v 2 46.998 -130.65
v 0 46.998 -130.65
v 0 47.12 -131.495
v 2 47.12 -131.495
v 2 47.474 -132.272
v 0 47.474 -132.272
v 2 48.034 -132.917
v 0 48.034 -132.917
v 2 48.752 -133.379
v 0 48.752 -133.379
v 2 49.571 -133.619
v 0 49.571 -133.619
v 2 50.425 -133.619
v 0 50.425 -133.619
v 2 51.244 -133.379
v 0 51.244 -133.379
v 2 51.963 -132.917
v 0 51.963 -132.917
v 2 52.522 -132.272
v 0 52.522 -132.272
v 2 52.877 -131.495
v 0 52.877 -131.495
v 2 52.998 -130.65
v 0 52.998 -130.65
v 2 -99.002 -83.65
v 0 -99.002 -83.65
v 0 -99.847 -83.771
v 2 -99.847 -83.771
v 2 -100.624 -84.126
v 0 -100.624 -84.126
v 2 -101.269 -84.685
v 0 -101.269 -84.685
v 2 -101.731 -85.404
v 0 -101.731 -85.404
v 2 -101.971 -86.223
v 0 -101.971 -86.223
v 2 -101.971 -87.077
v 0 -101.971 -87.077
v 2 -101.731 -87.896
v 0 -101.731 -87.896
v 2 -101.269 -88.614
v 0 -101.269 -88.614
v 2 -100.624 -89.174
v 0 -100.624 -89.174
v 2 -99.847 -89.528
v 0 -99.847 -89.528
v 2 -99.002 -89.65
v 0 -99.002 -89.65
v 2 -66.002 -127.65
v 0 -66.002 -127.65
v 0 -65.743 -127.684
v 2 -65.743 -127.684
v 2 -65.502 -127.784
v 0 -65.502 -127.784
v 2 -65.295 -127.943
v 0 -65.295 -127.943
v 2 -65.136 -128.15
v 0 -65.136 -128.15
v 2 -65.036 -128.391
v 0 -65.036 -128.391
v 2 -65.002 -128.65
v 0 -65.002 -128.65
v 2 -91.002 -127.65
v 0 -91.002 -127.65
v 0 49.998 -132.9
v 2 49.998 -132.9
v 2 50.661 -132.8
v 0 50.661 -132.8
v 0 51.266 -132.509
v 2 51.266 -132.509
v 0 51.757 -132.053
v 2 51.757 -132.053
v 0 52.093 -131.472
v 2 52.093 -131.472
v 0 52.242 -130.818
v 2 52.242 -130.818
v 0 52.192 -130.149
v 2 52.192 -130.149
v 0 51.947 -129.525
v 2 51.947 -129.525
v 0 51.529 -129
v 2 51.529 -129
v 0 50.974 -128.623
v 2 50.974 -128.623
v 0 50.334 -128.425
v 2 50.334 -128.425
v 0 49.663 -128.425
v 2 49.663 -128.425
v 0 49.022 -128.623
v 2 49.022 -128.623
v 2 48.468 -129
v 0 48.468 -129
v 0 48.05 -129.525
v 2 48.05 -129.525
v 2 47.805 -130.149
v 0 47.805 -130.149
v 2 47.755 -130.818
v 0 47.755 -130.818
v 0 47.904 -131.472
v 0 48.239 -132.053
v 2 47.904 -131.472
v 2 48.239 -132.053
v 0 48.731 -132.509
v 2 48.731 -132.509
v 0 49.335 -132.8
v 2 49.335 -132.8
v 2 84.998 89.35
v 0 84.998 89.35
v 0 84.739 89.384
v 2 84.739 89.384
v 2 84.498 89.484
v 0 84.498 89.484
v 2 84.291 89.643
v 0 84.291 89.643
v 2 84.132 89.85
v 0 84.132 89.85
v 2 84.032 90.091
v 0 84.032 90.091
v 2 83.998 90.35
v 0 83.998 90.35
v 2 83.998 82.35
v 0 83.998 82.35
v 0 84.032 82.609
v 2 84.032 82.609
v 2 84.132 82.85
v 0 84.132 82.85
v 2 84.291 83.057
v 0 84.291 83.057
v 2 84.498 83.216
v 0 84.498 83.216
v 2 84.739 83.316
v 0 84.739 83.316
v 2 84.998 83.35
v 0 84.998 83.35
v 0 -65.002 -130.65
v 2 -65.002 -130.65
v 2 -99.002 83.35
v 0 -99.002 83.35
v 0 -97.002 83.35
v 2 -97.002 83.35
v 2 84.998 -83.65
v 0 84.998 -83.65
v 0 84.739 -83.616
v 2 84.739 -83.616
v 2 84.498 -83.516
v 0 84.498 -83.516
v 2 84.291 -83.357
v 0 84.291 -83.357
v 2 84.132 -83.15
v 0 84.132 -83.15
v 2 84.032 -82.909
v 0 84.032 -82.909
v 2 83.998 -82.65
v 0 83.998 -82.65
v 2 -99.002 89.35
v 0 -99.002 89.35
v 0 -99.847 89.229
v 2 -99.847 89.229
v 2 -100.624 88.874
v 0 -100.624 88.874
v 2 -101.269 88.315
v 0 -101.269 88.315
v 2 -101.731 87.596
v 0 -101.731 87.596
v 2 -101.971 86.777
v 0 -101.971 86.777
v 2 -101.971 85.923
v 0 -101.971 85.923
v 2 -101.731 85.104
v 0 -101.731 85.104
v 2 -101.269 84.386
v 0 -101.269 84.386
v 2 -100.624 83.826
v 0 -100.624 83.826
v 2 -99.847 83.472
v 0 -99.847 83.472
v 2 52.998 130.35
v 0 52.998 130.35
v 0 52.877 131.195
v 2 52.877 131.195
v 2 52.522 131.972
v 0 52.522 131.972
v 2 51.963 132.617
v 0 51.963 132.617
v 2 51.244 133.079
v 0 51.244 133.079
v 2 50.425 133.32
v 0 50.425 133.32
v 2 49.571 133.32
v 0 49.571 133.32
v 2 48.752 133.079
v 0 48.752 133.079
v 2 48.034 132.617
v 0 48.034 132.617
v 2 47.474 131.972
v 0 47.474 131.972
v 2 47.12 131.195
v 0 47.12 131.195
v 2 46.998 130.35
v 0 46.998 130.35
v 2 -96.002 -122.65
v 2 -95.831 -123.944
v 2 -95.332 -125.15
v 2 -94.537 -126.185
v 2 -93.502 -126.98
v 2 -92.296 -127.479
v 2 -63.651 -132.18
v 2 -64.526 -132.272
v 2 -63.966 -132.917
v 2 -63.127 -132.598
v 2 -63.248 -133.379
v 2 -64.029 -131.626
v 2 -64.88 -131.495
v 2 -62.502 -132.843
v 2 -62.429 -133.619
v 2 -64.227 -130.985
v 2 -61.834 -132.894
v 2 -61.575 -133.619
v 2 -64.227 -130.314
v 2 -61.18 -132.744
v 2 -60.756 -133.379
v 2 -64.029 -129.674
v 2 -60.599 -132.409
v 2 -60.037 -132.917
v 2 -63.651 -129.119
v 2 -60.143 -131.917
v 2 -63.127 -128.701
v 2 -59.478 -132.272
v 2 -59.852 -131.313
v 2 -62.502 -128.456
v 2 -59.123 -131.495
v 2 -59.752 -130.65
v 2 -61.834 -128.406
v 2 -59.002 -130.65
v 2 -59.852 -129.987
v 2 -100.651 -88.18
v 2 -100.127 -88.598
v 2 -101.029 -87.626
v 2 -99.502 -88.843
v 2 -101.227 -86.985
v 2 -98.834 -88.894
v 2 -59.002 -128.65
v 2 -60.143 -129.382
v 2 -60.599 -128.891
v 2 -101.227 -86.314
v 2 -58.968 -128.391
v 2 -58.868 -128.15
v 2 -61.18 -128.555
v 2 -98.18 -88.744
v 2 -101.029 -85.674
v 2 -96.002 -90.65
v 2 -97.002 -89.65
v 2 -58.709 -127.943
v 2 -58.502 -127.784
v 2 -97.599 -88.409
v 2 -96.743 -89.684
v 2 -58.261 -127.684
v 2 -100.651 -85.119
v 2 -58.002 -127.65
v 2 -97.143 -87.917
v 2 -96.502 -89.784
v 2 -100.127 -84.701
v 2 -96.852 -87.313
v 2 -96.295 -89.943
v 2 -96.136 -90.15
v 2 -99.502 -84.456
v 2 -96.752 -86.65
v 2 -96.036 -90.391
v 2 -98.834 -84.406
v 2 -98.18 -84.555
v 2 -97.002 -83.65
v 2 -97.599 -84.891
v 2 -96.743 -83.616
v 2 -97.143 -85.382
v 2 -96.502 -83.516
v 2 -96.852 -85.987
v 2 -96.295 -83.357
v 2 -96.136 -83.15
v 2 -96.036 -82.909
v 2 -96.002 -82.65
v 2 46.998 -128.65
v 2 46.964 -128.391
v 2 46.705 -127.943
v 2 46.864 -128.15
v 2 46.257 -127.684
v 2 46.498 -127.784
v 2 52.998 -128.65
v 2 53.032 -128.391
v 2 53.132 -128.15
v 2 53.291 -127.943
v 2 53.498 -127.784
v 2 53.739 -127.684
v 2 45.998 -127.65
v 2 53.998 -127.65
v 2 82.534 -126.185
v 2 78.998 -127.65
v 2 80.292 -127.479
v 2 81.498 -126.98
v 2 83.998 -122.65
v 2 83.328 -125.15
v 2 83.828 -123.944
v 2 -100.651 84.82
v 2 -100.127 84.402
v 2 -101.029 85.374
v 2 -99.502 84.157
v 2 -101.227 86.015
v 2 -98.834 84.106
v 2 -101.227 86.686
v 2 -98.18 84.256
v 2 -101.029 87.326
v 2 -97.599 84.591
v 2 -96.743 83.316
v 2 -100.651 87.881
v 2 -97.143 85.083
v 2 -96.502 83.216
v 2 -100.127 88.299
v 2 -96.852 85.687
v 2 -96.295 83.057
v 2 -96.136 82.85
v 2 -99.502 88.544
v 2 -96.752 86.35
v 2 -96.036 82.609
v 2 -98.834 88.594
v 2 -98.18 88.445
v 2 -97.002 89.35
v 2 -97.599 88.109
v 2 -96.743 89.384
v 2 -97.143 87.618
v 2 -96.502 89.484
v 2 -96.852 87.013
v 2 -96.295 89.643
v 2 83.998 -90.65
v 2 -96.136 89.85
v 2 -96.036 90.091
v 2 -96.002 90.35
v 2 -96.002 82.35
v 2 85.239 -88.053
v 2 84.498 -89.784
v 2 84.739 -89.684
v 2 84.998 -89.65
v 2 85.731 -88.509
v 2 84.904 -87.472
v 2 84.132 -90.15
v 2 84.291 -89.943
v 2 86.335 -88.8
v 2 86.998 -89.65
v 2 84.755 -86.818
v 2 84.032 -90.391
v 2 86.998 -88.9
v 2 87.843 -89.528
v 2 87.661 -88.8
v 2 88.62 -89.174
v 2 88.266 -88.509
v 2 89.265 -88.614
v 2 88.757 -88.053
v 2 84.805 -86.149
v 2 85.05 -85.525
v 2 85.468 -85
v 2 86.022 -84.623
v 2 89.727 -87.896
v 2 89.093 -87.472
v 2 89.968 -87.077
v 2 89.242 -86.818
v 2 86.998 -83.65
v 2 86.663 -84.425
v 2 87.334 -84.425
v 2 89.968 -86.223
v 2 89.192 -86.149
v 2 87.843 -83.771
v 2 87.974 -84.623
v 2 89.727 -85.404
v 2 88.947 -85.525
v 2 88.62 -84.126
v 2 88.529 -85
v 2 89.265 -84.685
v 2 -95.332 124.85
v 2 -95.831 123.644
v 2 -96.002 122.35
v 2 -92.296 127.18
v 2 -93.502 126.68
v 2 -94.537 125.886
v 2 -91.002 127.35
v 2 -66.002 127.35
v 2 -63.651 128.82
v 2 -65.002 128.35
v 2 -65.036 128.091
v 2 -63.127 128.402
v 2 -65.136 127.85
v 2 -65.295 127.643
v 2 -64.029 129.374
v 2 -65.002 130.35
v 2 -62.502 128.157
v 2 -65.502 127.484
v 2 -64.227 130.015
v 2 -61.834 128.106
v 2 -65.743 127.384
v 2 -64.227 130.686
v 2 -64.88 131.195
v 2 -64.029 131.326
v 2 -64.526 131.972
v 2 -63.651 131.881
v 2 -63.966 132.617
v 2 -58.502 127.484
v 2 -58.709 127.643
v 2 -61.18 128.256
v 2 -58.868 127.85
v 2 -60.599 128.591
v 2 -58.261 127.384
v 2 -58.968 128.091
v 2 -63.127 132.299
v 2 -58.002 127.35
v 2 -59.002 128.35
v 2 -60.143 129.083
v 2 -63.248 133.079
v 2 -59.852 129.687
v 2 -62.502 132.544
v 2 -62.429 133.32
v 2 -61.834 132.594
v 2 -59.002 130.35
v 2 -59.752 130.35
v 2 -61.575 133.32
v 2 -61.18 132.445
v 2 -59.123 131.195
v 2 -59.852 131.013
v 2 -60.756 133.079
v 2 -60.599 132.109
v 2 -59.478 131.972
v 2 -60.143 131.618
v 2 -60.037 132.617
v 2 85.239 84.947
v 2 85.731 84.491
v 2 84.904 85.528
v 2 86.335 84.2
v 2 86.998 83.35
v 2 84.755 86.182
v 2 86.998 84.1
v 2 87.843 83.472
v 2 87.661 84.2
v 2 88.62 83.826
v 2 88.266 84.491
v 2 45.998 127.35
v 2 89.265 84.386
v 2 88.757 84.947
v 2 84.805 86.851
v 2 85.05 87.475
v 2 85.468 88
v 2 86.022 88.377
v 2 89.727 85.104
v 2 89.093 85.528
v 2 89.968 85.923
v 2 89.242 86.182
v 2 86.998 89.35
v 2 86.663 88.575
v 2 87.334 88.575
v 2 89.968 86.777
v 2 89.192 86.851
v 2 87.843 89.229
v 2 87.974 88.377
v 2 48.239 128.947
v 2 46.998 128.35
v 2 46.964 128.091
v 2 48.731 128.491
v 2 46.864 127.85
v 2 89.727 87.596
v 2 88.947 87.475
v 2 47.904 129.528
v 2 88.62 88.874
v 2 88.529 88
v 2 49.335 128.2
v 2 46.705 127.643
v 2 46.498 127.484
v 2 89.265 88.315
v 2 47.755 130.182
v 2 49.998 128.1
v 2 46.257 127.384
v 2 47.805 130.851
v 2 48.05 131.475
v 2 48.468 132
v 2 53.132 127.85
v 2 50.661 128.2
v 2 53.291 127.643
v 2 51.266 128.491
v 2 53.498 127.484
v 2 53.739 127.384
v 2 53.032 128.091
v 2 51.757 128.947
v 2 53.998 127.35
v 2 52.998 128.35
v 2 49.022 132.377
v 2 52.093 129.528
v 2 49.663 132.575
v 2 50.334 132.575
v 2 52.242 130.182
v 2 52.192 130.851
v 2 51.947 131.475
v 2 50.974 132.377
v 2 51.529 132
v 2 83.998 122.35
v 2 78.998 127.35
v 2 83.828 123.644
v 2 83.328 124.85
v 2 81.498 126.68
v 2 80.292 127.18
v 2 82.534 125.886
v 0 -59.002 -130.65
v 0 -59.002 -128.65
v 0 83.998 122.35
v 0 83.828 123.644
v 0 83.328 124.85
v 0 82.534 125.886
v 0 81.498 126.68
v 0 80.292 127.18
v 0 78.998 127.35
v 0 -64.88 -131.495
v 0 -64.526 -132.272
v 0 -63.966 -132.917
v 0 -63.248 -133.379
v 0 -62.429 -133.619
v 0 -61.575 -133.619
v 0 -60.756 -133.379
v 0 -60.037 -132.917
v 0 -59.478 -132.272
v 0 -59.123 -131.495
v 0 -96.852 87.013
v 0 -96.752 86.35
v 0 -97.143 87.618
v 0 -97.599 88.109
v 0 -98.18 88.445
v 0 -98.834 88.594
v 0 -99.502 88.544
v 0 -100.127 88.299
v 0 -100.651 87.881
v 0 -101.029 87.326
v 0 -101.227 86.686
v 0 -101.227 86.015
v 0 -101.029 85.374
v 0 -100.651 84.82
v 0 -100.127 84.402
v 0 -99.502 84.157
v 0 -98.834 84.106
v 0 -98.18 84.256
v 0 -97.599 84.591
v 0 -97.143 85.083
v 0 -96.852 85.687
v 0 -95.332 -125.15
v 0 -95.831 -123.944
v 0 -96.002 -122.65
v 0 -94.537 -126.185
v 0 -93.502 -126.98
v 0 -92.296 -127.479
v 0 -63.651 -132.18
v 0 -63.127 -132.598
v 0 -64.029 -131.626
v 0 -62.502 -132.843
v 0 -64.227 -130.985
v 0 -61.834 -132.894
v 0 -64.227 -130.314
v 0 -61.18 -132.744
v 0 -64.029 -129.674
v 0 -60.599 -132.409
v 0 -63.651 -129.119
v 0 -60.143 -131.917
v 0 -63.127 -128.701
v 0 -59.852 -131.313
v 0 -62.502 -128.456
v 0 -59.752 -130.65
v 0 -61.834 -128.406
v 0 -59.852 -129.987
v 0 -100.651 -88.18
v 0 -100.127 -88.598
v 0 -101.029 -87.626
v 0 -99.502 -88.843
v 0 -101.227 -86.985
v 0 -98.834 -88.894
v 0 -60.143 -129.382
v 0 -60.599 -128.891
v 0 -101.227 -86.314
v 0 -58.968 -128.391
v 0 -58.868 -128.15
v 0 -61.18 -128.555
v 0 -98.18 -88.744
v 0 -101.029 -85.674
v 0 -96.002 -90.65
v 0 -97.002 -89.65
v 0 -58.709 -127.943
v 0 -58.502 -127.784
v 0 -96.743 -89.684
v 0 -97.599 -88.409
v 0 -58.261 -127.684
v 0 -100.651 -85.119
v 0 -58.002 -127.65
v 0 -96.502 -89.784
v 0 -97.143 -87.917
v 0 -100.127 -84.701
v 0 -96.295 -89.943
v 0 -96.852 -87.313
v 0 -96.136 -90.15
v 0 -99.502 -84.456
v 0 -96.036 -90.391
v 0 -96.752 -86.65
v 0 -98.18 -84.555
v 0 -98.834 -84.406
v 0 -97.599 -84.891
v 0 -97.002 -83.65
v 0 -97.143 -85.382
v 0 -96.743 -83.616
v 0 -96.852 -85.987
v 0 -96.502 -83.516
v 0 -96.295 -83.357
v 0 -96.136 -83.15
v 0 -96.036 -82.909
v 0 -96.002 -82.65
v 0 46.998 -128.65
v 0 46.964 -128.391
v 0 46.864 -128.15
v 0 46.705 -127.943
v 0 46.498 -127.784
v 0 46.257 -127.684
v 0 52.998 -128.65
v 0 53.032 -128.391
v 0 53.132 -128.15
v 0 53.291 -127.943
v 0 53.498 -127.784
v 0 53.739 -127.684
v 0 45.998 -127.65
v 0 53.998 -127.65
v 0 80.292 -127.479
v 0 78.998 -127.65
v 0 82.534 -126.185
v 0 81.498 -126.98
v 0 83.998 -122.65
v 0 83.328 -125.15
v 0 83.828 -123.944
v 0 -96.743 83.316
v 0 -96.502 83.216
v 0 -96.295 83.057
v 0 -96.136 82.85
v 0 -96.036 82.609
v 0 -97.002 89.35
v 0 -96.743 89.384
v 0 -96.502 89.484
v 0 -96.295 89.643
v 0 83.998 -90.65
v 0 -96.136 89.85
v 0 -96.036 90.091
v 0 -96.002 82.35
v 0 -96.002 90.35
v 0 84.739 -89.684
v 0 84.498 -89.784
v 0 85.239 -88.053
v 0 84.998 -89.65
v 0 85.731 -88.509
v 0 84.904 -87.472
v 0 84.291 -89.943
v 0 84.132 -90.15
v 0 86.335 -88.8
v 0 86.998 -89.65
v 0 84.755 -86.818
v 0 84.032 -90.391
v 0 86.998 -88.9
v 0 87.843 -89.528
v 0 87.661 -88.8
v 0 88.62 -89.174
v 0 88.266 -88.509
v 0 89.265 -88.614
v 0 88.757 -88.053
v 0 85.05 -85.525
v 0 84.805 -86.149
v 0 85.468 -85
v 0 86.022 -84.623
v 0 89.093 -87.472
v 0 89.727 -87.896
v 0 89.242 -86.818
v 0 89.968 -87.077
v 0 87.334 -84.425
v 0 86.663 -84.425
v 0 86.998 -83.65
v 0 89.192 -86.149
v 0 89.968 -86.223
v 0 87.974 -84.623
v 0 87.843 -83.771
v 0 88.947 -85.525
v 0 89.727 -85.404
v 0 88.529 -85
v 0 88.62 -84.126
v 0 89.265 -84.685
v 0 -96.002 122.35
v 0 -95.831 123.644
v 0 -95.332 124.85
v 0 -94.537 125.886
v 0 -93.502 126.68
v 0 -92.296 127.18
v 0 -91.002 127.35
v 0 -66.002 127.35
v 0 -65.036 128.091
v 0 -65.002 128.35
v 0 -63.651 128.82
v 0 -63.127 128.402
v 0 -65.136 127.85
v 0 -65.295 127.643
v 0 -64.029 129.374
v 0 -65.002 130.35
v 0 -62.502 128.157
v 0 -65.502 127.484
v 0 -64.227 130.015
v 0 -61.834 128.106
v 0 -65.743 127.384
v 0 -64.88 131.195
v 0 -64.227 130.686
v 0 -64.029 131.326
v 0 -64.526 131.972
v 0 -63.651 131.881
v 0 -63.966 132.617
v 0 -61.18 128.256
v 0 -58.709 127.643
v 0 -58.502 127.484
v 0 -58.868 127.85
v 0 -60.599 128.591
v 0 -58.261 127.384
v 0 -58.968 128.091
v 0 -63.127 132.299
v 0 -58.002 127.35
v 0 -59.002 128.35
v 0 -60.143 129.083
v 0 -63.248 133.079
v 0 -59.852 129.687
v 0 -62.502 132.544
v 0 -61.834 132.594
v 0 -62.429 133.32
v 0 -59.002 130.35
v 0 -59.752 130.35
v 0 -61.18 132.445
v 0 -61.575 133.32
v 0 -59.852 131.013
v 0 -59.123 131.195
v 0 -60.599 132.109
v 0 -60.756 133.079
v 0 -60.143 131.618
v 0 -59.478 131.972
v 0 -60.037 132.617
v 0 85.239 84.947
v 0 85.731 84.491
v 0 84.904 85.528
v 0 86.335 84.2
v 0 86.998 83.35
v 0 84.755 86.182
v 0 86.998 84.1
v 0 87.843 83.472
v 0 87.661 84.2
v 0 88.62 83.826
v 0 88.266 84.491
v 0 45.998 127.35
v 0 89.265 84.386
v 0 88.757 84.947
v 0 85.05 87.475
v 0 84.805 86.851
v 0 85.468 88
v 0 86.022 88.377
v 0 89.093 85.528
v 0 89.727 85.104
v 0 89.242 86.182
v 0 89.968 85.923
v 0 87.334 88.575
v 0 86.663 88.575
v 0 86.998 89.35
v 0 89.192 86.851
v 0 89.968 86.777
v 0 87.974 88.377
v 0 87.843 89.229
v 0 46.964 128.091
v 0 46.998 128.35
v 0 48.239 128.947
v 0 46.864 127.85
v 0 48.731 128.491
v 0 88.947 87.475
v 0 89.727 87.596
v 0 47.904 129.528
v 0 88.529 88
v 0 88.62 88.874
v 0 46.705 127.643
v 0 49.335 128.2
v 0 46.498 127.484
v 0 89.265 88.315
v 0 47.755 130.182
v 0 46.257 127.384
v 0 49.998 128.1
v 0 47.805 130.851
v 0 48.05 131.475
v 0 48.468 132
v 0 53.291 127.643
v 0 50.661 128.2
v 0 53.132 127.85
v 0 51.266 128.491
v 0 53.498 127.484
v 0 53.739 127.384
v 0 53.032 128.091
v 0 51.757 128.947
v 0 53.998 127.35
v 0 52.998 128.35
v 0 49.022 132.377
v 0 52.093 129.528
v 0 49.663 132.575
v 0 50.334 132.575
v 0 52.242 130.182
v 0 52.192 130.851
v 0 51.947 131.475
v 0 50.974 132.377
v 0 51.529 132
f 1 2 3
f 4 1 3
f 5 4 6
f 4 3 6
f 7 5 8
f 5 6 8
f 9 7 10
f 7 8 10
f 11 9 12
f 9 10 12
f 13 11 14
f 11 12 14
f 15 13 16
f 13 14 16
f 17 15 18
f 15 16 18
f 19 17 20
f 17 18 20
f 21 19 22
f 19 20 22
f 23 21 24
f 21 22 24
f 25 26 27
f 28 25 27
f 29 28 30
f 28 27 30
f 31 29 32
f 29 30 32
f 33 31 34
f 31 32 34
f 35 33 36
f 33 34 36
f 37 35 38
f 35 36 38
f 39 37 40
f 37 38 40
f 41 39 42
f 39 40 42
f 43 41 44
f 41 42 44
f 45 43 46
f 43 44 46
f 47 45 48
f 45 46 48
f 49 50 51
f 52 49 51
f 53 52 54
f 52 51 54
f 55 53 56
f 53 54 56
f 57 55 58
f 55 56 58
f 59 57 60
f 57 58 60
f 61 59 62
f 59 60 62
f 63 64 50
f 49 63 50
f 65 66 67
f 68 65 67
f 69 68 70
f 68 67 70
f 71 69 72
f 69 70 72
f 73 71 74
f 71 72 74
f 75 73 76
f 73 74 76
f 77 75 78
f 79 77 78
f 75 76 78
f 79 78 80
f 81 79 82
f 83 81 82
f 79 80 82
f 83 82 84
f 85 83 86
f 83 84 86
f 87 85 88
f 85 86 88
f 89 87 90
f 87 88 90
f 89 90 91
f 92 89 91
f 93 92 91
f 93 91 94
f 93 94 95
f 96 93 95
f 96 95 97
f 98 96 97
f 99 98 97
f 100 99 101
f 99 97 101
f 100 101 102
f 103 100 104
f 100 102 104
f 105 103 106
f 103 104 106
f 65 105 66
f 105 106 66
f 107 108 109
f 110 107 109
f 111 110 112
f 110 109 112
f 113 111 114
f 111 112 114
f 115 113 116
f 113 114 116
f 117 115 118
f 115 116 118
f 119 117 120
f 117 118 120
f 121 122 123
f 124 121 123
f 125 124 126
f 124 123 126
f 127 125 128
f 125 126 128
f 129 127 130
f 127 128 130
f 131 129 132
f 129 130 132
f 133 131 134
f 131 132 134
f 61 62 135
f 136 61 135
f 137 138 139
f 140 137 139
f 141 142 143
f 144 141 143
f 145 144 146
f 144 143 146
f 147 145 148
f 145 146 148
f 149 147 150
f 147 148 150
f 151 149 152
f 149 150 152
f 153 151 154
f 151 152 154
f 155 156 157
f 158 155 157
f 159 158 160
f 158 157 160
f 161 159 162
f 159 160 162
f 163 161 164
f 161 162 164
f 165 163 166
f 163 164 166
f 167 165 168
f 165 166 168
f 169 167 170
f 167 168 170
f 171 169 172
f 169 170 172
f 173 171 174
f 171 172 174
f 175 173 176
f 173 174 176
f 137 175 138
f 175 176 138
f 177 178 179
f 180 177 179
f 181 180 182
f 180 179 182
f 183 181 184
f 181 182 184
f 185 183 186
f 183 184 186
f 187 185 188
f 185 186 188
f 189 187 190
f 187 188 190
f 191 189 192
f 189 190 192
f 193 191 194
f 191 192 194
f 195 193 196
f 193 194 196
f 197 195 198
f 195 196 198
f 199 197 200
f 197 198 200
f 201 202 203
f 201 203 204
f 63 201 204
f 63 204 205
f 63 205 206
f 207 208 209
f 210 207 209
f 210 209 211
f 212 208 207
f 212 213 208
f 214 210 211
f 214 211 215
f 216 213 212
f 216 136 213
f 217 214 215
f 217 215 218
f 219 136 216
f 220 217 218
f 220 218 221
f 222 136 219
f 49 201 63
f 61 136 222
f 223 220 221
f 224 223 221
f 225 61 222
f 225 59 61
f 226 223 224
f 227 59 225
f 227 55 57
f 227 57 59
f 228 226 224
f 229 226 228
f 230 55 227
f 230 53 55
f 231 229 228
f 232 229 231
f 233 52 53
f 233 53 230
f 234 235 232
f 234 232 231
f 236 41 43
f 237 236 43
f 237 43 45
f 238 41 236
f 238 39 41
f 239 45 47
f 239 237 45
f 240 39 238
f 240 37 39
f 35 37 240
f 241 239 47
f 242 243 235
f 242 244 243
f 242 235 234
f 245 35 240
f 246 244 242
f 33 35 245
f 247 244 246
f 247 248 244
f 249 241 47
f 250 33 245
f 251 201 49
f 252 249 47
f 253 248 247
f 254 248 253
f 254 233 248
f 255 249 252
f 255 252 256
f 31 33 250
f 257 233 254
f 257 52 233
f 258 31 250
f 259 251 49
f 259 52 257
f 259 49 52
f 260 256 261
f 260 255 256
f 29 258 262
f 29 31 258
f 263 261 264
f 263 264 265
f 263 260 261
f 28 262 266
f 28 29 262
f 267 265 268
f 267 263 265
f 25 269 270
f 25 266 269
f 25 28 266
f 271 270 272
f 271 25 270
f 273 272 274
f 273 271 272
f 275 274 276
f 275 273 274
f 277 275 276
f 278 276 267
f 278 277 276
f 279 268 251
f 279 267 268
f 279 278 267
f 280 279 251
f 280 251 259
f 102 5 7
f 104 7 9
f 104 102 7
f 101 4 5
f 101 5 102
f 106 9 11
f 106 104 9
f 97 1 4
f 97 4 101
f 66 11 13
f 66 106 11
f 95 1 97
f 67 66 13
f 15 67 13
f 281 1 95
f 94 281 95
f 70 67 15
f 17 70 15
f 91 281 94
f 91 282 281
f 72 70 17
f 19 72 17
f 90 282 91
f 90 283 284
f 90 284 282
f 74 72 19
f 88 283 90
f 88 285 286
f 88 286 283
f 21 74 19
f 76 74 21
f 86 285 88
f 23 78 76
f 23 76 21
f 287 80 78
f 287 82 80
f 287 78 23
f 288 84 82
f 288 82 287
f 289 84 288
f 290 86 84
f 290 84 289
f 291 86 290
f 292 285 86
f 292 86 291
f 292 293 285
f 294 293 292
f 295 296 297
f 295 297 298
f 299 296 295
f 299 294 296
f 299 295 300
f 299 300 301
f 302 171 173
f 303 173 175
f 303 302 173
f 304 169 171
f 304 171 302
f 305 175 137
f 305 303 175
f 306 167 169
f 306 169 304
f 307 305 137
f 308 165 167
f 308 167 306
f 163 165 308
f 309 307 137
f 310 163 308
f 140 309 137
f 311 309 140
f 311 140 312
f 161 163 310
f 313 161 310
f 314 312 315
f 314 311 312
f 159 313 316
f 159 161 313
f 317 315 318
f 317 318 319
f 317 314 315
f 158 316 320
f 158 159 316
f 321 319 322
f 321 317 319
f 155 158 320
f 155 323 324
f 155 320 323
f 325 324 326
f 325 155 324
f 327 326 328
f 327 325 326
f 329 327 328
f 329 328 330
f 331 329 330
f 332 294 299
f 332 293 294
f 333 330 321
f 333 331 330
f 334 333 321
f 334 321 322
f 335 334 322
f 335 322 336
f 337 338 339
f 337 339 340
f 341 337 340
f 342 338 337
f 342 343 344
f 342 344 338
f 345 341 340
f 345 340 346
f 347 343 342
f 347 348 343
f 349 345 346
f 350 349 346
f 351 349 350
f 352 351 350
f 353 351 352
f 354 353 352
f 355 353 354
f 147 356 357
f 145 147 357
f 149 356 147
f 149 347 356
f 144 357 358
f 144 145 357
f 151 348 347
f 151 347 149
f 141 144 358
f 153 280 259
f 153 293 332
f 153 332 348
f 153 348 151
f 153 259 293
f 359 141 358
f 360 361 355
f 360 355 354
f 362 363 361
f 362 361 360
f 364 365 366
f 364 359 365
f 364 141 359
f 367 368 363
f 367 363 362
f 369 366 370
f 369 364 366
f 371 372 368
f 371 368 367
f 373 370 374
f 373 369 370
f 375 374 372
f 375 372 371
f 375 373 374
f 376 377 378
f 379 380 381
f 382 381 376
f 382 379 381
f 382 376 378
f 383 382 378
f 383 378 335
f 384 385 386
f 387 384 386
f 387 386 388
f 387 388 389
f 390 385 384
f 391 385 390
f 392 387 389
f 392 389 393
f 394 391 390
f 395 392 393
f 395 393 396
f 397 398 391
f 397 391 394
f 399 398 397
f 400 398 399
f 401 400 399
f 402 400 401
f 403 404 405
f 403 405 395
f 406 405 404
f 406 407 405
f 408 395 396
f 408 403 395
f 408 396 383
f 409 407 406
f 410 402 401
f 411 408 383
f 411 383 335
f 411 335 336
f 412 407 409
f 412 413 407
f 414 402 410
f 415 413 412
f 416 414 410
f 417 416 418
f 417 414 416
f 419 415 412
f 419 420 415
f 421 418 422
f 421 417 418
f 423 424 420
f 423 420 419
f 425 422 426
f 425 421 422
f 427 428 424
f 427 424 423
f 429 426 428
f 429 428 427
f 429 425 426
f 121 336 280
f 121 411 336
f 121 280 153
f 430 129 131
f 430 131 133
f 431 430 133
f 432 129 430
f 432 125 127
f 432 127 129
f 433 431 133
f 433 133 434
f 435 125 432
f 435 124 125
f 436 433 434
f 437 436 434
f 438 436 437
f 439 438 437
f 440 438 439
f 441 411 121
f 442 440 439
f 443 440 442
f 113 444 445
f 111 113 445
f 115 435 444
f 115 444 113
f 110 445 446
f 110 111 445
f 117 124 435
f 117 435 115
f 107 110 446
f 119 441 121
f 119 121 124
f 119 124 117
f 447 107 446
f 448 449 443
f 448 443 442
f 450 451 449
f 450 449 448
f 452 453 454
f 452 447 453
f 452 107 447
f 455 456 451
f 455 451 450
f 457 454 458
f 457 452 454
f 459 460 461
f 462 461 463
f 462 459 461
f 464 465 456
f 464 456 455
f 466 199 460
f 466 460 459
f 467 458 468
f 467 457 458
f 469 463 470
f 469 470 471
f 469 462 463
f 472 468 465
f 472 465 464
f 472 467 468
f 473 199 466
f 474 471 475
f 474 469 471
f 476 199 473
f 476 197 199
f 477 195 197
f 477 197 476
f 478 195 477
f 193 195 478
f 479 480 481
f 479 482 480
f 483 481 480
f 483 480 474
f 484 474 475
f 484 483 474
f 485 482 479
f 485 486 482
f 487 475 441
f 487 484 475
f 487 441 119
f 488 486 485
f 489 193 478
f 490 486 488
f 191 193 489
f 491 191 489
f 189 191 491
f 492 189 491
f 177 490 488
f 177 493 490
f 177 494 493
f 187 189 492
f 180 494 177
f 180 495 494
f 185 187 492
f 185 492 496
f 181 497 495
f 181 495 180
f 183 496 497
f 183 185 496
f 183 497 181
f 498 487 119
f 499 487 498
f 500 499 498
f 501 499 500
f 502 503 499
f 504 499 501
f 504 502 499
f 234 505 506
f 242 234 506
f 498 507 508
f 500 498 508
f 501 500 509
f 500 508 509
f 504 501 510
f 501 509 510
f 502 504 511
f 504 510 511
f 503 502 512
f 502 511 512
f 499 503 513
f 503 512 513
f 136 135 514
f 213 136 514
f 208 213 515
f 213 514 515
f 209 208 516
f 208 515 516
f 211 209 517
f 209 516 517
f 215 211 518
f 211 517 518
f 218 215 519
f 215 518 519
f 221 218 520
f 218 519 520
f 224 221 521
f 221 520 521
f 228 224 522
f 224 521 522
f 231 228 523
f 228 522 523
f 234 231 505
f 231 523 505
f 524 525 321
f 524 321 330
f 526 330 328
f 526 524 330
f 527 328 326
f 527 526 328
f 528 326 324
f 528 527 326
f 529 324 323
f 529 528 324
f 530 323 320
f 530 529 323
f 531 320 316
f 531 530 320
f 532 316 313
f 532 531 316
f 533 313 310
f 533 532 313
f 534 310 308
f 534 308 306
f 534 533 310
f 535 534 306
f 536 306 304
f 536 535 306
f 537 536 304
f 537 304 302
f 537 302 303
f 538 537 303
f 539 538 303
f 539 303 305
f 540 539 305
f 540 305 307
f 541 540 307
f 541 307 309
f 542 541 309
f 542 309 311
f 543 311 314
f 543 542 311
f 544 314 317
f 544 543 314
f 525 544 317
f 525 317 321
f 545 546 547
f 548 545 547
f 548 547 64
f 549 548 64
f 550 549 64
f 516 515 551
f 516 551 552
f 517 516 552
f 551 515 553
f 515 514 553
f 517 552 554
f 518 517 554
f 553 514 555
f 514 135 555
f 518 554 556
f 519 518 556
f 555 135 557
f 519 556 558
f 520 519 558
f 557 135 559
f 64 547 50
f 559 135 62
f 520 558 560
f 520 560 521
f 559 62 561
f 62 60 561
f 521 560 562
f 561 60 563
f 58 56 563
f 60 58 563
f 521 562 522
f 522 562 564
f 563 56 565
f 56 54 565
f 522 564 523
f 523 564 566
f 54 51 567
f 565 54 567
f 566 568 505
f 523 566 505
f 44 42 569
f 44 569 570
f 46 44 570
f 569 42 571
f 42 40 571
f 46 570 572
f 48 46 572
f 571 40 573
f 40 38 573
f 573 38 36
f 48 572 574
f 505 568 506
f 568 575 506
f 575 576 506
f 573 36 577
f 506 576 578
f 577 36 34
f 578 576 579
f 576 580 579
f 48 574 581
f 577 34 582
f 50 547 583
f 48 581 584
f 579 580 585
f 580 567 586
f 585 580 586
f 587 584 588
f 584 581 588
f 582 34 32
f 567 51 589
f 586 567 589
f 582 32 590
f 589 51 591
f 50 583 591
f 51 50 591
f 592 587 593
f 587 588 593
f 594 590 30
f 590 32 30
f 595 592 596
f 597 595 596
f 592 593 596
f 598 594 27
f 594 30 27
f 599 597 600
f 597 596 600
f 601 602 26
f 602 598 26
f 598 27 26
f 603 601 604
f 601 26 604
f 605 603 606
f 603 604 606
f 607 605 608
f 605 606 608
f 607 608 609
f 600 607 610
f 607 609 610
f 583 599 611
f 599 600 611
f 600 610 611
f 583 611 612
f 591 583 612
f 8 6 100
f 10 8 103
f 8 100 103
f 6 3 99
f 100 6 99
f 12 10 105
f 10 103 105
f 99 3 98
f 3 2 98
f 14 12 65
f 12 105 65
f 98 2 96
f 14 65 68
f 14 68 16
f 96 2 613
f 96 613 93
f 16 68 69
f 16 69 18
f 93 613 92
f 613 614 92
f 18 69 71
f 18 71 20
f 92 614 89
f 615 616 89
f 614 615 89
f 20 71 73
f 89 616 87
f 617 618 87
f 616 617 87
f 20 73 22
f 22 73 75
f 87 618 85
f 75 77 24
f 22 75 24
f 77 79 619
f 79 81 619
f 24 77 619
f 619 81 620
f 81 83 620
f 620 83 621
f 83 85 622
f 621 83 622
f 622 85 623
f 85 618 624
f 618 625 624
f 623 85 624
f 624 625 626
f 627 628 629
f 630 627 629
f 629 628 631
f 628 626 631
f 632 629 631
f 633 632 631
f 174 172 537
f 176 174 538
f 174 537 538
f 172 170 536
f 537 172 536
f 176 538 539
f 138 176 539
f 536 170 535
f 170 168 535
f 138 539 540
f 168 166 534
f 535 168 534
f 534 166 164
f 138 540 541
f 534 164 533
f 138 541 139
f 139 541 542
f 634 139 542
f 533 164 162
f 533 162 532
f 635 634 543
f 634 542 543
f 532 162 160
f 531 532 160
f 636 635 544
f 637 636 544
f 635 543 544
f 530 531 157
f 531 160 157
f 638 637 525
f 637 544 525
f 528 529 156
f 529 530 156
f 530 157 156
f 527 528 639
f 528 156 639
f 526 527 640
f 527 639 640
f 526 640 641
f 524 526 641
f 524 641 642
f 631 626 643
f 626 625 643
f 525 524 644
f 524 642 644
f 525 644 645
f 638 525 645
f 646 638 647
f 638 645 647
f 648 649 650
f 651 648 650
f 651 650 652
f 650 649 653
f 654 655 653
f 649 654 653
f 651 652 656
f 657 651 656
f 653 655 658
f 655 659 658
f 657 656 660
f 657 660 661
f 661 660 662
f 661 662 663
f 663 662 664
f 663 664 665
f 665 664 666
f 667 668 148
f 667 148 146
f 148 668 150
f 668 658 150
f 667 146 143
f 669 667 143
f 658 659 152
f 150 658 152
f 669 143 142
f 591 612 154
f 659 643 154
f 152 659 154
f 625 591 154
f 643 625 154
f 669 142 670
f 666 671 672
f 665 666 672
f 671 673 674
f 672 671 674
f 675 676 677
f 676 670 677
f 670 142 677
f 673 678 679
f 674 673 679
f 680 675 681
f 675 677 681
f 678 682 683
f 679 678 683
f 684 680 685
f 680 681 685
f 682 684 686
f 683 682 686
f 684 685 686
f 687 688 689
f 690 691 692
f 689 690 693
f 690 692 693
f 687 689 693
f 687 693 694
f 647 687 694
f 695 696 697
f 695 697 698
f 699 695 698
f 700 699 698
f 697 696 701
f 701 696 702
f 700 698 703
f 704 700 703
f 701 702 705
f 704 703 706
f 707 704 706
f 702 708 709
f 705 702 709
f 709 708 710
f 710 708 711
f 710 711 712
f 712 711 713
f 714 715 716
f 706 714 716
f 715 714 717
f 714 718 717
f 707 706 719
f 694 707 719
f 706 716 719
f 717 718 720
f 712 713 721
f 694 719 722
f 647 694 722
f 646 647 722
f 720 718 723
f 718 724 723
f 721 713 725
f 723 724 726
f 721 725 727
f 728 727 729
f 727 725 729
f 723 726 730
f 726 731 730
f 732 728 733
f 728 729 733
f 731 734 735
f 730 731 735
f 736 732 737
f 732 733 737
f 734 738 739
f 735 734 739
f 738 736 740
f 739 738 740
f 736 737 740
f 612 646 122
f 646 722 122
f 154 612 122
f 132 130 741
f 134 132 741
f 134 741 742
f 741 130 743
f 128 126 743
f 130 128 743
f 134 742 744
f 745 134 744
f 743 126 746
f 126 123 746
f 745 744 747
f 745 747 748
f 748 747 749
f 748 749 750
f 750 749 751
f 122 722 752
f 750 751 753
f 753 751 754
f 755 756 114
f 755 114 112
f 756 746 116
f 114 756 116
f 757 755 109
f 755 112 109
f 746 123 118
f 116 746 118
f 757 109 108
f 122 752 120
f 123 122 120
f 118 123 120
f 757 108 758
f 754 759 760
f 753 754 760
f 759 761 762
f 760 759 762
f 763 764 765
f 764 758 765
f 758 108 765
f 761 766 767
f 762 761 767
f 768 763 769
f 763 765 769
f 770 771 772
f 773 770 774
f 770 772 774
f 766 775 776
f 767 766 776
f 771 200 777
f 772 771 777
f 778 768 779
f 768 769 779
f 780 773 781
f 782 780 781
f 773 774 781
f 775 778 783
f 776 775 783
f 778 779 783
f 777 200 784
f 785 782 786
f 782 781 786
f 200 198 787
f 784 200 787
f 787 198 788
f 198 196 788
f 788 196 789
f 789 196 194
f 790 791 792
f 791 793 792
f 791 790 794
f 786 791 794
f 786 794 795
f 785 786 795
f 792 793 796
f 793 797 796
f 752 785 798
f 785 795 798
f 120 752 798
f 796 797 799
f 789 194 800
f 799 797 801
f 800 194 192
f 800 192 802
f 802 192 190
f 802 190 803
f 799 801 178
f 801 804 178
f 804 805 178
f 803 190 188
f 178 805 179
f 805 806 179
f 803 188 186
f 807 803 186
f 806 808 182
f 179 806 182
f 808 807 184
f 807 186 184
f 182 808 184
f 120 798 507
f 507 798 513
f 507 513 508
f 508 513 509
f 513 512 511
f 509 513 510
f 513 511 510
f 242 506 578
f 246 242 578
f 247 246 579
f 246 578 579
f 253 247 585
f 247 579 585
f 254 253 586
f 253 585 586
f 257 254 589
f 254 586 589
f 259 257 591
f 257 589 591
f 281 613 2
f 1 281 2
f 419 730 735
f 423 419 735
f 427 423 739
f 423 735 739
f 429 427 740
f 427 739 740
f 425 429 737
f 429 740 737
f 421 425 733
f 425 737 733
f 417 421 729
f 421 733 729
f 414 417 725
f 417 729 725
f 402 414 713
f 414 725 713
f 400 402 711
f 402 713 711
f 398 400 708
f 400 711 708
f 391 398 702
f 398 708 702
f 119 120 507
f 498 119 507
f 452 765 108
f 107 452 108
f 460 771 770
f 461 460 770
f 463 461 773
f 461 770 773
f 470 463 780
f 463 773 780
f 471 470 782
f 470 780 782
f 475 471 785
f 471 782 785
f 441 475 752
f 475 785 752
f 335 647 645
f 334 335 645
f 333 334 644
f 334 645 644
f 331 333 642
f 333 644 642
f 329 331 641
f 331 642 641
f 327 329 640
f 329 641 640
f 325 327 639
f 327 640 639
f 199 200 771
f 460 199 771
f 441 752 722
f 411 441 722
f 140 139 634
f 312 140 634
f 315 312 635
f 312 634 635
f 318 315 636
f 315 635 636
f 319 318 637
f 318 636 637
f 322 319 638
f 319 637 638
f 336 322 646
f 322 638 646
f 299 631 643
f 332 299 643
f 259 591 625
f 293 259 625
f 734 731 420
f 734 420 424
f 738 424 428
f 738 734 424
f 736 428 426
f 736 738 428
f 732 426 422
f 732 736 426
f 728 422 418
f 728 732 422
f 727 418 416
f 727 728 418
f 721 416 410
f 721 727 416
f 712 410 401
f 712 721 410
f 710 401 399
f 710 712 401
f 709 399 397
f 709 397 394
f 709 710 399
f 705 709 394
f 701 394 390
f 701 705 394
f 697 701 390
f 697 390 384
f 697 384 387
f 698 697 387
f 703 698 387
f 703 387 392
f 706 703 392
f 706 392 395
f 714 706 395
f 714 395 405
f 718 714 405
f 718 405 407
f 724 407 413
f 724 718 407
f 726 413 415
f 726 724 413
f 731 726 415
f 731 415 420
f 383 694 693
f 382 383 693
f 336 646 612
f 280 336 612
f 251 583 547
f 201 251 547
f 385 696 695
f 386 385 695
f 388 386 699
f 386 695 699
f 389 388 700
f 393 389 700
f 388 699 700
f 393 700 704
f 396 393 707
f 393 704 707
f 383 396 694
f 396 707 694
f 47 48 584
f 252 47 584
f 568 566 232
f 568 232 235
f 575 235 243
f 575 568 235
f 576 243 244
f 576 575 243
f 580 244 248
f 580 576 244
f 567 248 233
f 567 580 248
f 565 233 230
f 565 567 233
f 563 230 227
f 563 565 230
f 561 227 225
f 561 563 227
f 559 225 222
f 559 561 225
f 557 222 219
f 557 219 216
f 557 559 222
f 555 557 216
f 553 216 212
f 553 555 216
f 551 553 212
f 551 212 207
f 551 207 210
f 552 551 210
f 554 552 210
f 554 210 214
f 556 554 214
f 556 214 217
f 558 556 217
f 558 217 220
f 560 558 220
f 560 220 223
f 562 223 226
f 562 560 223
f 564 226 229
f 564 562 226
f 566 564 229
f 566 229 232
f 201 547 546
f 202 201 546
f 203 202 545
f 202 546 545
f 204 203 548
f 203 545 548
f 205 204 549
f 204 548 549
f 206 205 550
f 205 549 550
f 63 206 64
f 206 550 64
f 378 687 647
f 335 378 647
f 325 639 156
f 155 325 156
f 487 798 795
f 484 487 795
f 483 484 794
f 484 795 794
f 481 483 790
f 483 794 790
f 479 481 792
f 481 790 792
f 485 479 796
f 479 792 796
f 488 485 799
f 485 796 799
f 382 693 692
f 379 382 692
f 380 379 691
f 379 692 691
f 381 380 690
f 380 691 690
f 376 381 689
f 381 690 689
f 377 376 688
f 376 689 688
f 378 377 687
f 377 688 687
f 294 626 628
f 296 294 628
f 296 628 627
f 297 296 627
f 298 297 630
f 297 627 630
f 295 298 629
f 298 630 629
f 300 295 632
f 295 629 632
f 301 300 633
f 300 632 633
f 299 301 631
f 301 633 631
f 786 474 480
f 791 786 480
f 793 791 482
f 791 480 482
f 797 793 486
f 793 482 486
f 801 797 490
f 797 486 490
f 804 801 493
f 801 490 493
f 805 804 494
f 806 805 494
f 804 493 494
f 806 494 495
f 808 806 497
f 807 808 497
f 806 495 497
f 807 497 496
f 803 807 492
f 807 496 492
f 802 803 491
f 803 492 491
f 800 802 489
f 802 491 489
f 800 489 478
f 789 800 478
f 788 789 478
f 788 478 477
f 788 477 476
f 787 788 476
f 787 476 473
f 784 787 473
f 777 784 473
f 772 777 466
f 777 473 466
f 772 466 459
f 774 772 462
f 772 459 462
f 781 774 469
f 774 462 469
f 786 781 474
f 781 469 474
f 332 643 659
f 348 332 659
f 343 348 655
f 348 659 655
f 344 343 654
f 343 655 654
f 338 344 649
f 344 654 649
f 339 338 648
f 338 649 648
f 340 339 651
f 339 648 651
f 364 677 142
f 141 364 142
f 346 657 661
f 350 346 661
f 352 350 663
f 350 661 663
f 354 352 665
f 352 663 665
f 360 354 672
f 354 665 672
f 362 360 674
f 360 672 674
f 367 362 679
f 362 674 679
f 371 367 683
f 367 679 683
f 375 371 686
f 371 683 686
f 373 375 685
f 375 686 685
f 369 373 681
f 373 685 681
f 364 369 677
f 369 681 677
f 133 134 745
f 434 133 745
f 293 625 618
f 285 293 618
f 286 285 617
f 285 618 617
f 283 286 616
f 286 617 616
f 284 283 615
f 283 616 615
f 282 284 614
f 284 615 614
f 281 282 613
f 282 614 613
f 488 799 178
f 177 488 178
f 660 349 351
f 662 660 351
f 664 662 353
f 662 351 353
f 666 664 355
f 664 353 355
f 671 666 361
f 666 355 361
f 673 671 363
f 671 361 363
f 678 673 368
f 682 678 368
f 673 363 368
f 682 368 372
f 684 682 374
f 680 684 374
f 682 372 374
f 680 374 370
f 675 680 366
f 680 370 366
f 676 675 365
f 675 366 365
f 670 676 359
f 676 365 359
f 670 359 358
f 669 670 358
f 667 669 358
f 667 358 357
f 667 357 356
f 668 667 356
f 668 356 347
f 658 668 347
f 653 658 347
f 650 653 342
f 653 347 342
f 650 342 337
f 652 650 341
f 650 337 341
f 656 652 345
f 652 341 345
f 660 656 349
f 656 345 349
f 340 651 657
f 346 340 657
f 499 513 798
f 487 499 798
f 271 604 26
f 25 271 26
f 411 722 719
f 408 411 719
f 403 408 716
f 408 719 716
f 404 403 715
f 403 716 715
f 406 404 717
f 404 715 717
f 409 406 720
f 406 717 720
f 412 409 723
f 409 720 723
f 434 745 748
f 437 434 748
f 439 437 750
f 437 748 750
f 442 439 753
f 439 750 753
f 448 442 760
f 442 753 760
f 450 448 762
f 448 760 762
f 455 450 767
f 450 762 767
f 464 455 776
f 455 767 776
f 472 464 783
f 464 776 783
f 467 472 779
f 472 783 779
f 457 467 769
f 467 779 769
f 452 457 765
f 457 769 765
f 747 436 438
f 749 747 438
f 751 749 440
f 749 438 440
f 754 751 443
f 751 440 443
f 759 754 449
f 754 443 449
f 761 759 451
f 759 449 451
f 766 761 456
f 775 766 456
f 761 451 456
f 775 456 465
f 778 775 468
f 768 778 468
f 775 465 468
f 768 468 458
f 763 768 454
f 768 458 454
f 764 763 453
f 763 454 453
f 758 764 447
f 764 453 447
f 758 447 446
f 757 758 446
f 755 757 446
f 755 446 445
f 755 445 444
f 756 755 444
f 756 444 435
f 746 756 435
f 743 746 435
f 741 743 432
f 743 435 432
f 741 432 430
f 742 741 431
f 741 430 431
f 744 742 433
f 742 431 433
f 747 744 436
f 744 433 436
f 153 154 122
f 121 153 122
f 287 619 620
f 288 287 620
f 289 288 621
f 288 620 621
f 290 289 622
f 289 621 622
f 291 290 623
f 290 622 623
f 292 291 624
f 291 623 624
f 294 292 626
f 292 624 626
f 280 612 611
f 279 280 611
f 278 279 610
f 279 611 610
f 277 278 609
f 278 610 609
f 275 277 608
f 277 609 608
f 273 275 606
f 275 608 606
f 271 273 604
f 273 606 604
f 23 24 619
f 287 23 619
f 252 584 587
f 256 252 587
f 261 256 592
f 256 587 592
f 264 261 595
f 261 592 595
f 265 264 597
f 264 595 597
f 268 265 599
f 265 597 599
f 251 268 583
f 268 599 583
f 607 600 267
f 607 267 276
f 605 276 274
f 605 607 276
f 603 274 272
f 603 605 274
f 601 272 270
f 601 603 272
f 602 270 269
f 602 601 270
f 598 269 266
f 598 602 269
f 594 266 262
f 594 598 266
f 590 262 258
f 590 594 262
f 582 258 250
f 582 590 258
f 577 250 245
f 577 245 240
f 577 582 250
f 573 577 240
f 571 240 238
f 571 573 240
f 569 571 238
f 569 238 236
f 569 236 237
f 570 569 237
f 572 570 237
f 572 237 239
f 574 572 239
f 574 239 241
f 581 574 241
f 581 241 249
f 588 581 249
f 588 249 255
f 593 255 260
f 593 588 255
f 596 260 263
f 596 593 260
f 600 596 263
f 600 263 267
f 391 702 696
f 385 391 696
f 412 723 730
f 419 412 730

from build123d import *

# Parameters (mm, degrees)
IZIM1_R                     = 1.6
Y_KSEKLIK_EKSTR_ZYON1_DEPTH = 2
IZIM2_R                     = 2.25
KES_EKSTR_ZYON1_DEPTH       = 2
Y_Z_TA_1_OUTLINE_R          = 2.25
Y_Z_TA_1_DEPTH              = 2
Y_Z_TA_1_2_OUTLINE_R        = 2.25
Y_Z_TA_1_2_DEPTH            = 2


# Read off the part's stored shape, not the designer's step: Yüzü Taşı1
with BuildPart() as part:
    # Çizim1 → Yükseklik-Ekstrüzyon1 (new body)
    with BuildSketch(Plane.YZ):
        with BuildLine():
            Line((78.998248848, 127.350175115), (53.998248848, 127.350175115))
            ThreePointArc((53.998248848, 127.350175115), (53.291142067, 127.643068334), (52.998248848, 128.350175115))
            Line((52.998248848, 128.350175115), (52.998248848, 130.350175115))
            ThreePointArc((52.998248848, 130.350175115), (49.998248848, 133.350175115), (46.998248848, 130.350175115))
            Line((46.998248848, 130.350175115), (46.998248848, 128.350175115))
            ThreePointArc((46.998248848, 128.350175115), (46.705355629, 127.643068334), (45.998248848, 127.350175115))
            Line((45.998248848, 127.350175115), (-43.001751152, 127.350175115))
            ThreePointArc((-43.001751152, 127.350175115), (-43.708857933, 127.643068334), (-44.001751152, 128.350175115))
            Line((-44.001751152, 128.350175115), (-44.001751152, 130.350175115))
            ThreePointArc((-44.001751152, 130.350175115), (-47.001751152, 133.350175115), (-50.001751152, 130.350175115))
            Line((-50.001751152, 130.350175115), (-50.001751152, 128.350175115))
            ThreePointArc((-50.001751152, 128.350175115), (-50.294644371, 127.643068334), (-51.001751152, 127.350175115))
            Line((-51.001751152, 127.350175115), (-76.001751152, 127.350175115))
            ThreePointArc((-76.001751152, 127.350175115), (-79.537285058, 125.885709021), (-81.001751152, 122.350175115))
            Line((-81.001751152, 122.350175115), (-81.001751152, 90.350175115))
            ThreePointArc((-81.001751152, 90.350175115), (-81.294644371, 89.643068334), (-82.001751152, 89.350175115))
            Line((-82.001751152, 89.350175115), (-84.001751152, 89.350175115))
            ThreePointArc((-84.001751152, 89.350175115), (-87.001751152, 86.350175115), (-84.001751152, 83.350175115))
            Line((-84.001751152, 83.350175115), (-82.001751152, 83.350175115))
            ThreePointArc((-82.001751152, 83.350175115), (-81.294644371, 83.057281896), (-81.001751152, 82.350175115))
            Line((-81.001751152, 82.350175115), (-81.001751152, -82.649824885))
            ThreePointArc((-81.001751152, -82.649824885), (-81.294644371, -83.356931666), (-82.001751152, -83.649824885))
            Line((-82.001751152, -83.649824885), (-84.001751152, -83.649824885))
            ThreePointArc((-84.001751152, -83.649824885), (-87.001751152, -86.649824885), (-84.001751152, -89.649824885))
            Line((-84.001751152, -89.649824885), (-82.001751152, -89.649824885))
            ThreePointArc((-82.001751152, -89.649824885), (-81.294644371, -89.942718104), (-81.001751152, -90.649824885))
            Line((-81.001751152, -90.649824885), (-81.001751152, -122.649824885))
            ThreePointArc((-81.001751152, -122.649824885), (-79.537285058, -126.185358791), (-76.001751152, -127.649824885))
            Line((-76.001751152, -127.649824885), (-51.001751152, -127.649824885))
            ThreePointArc((-51.001751152, -127.649824885), (-50.294644371, -127.942718104), (-50.001751152, -128.649824885))
            Line((-50.001751152, -128.649824885), (-50.001751152, -130.649824885))
            ThreePointArc((-50.001751152, -130.649824885), (-47.001751152, -133.649824885), (-44.001751152, -130.649824885))
            Line((-44.001751152, -130.649824885), (-44.001751152, -128.649824885))
            ThreePointArc((-44.001751152, -128.649824885), (-43.708857933, -127.942718104), (-43.001751152, -127.649824885))
            Line((-43.001751152, -127.649824885), (45.998248848, -127.649824885))
            ThreePointArc((45.998248848, -127.649824885), (46.705355629, -127.942718104), (46.998248848, -128.649824885))
            Line((46.998248848, -128.649824885), (46.998248848, -130.649824885))
            ThreePointArc((46.998248848, -130.649824885), (49.998248848, -133.649824885), (52.998248848, -130.649824885))
            Line((52.998248848, -130.649824885), (52.998248848, -128.649824885))
            ThreePointArc((52.998248848, -128.649824885), (53.291142067, -127.942718104), (53.998248848, -127.649824885))
            Line((53.998248848, -127.649824885), (78.998248848, -127.649824885))
            ThreePointArc((78.998248848, -127.649824885), (82.533782754, -126.185358791), (83.998248848, -122.649824885))
            Line((83.998248848, -122.649824885), (83.998248848, -90.649824885))
            ThreePointArc((83.998248848, -90.649824885), (84.291142067, -89.942718104), (84.998248848, -89.649824885))
            Line((84.998248848, -89.649824885), (86.998248848, -89.649824885))
            ThreePointArc((86.998248848, -89.649824885), (89.998248848, -86.649824885), (86.998248848, -83.649824885))
            Line((86.998248848, -83.649824885), (84.998248848, -83.649824885))
            ThreePointArc((84.998248848, -83.649824885), (84.291142067, -83.356931666), (83.998248848, -82.649824885))
            Line((83.998248848, -82.649824885), (83.998248848, 82.350175115))
            ThreePointArc((83.998248848, 82.350175115), (84.291142067, 83.057281896), (84.998248848, 83.350175115))
            Line((84.998248848, 83.350175115), (86.998248848, 83.350175115))
            ThreePointArc((86.998248848, 83.350175115), (89.998248848, 86.350175115), (86.998248848, 89.350175115))
            Line((86.998248848, 89.350175115), (84.998248848, 89.350175115))
            ThreePointArc((84.998248848, 89.350175115), (84.291142067, 89.643068334), (83.998248848, 90.350175115))
            Line((83.998248848, 90.350175115), (83.998248848, 122.350175115))
            ThreePointArc((83.998248848, 122.350175115), (82.533782754, 125.885709021), (78.998248848, 127.350175115))
        make_face()
        with Locations(Location((-84.001751152, -86.649824885, 0), (0, 0, 270))):
            Circle(IZIM1_R, mode=Mode.SUBTRACT)
        with Locations(Location((-47.001751152, -130.649824885, 0), (0, 0, 270))):
            Circle(IZIM1_R, mode=Mode.SUBTRACT)
        with Locations(Location((49.998248848, -130.649824885, 0), (0, 0, 270))):
            Circle(IZIM1_R, mode=Mode.SUBTRACT)
        with Locations(Location((86.998248848, -86.649824885, 0), (0, 0, 270))):
            Circle(IZIM1_R, mode=Mode.SUBTRACT)
        with Locations(Location((86.998248848, 86.350175115, 0), (0, 0, 270))):
            Circle(IZIM1_R, mode=Mode.SUBTRACT)
        with Locations(Location((49.998248848, 130.350175115, 0), (0, 0, 270))):
            Circle(IZIM1_R, mode=Mode.SUBTRACT)
        with Locations(Location((-47.001751152, 130.350175115, 0), (0, 0, 270))):
            Circle(IZIM1_R, mode=Mode.SUBTRACT)
        with Locations(Location((-84.001751152, 86.350175115, 0), (0, 0, 270))):
            Circle(IZIM1_R, mode=Mode.SUBTRACT)
    extrude(amount=Y_KSEKLIK_EKSTR_ZYON1_DEPTH)

    # Çizim2 → Kes-Ekstrüzyon1 (cut)
    with BuildSketch(Plane.YZ.offset(2)):
        with Locations(Location((-84.001751152, 86.350175115, 0), (0, 0, 270))):
            Circle(IZIM2_R)
    kes_ekstr_zyon1 = extrude(amount=-KES_EKSTR_ZYON1_DEPTH, mode=Mode.SUBTRACT)

    # Çizim-Çoğaltma1: Kes-Ekstrüzyon1 at 7 more places
    with Locations((0, 37, 44), (0, 134, 44), (0, 171, 0), (0, 171, -173), (0, 134, -217), (0, 37, -217), (0, 0, -173)):
        add(kes_ekstr_zyon1, mode=Mode.SUBTRACT)

    # Yüzü Taşı1 outline → Yüzü Taşı1 (cut)
    # profile 1 of 2: a face of its own
    with BuildSketch(Plane.YZ):
        with BuildLine():
            ThreePointArc((-50.001751152, 128.350175115), (-50.294644371, 127.643068334), (-51.001751152, 127.350175115))
            Line((-51.001751152, 127.350175115), (-43.001751152, 127.350175115))
            ThreePointArc((-43.001751152, 127.350175115), (-43.708857933, 127.643068334), (-44.001751152, 128.350175115))
            Line((-44.001751152, 128.350175115), (-44.001751152, 130.350175115))
            ThreePointArc((-44.001751152, 130.350175115), (-47.001751152, 133.350175115), (-50.001751152, 130.350175115))
            Line((-50.001751152, 130.350175115), (-50.001751152, 128.350175115))
        make_face()
        with Locations((-47.001751152, 130.350175115)):
            Circle(Y_Z_TA_1_OUTLINE_R, mode=Mode.SUBTRACT)
    # profile 2 of 2: a face of its own
    with BuildSketch(Plane.YZ):
        with BuildLine():
            Line((-43.001751152, -127.649824885), (-51.001751152, -127.649824885))
            ThreePointArc((-51.001751152, -127.649824885), (-50.294644371, -127.942718104), (-50.001751152, -128.649824885))
            Line((-50.001751152, -128.649824885), (-50.001751152, -130.649824885))
            ThreePointArc((-50.001751152, -130.649824885), (-47.001751152, -133.649824885), (-44.001751152, -130.649824885))
            Line((-44.001751152, -130.649824885), (-44.001751152, -128.649824885))
            ThreePointArc((-44.001751152, -128.649824885), (-43.708857933, -127.942718104), (-43.001751152, -127.649824885))
        make_face()
        with Locations((-47.001751152, -130.649824885)):
            Circle(Y_Z_TA_1_OUTLINE_R, mode=Mode.SUBTRACT)
    extrude(amount=Y_Z_TA_1_DEPTH, mode=Mode.SUBTRACT)

    # Y_z_ Ta_1 2 outline → Y_z_ Ta_1 2 (add)
    # profile 1 of 5: a face of its own
    with BuildSketch(Plane.YZ):
        with BuildLine():
            Line((-66.001751152, 127.350175115), (-58.001751152, 127.350175115))
            ThreePointArc((-58.001751152, 127.350175115), (-58.708857933, 127.643068334), (-59.001751152, 128.350175115))
            Line((-59.001751152, 128.350175115), (-59.001751152, 130.350175115))
            ThreePointArc((-59.001751152, 130.350175115), (-62.001751152, 133.350175115), (-65.001751152, 130.350175115))
            Line((-65.001751152, 130.350175115), (-65.001751152, 128.350175115))
            ThreePointArc((-65.001751152, 128.350175115), (-65.294644371, 127.643068334), (-66.001751152, 127.350175115))
        make_face()
        with Locations((-62.001751152, 130.350175115)):
            Circle(Y_Z_TA_1_2_OUTLINE_R, mode=Mode.SUBTRACT)
    # profile 2 of 5: a face of its own
    with BuildSketch(Plane.YZ):
        with BuildLine():
            Line((-58.001751152, -127.649824885), (-66.001751152, -127.649824885))
            ThreePointArc((-66.001751152, -127.649824885), (-65.294644371, -127.942718104), (-65.001751152, -128.649824885))
            Line((-65.001751152, -128.649824885), (-65.001751152, -130.649824885))
            ThreePointArc((-65.001751152, -130.649824885), (-62.001751152, -133.649824885), (-59.001751152, -130.649824885))
            Line((-59.001751152, -130.649824885), (-59.001751152, -128.649824885))
            ThreePointArc((-59.001751152, -128.649824885), (-58.708857933, -127.942718104), (-58.001751152, -127.649824885))
        make_face()
        with Locations((-62.001751152, -130.649824885)):
            Circle(Y_Z_TA_1_2_OUTLINE_R, mode=Mode.SUBTRACT)
    # profile 3 of 5: a face of its own
    with BuildSketch(Plane.YZ):
        with BuildLine():
            ThreePointArc((-81.001751152, 122.350175115), (-79.537285058, 125.885709021), (-76.001751152, 127.350175115))
            Line((-76.001751152, 127.350175115), (-91.001751152, 127.350175115))
            ThreePointArc((-91.001751152, 127.350175115), (-94.537285058, 125.885709021), (-96.001751152, 122.350175115))
            Line((-96.001751152, 122.350175115), (-96.001751152, 90.350175115))
            ThreePointArc((-96.001751152, 90.350175115), (-96.294644371, 89.643068334), (-97.001751152, 89.350175115))
            Line((-97.001751152, 89.350175115), (-99.001751152, 89.350175115))
            ThreePointArc((-99.001751152, 89.350175115), (-102.001751152, 86.350175115), (-99.001751152, 83.350175115))
            Line((-99.001751152, 83.350175115), (-97.001751152, 83.350175115))
            ThreePointArc((-97.001751152, 83.350175115), (-96.294644371, 83.057281896), (-96.001751152, 82.350175115))
            Line((-96.001751152, 82.350175115), (-96.001751152, -82.649824885))
            ThreePointArc((-96.001751152, -82.649824885), (-96.294644371, -83.356931666), (-97.001751152, -83.649824885))
            Line((-97.001751152, -83.649824885), (-99.001751152, -83.649824885))
            ThreePointArc((-99.001751152, -83.649824885), (-102.001751152, -86.649824885), (-99.001751152, -89.649824885))
            Line((-99.001751152, -89.649824885), (-97.001751152, -89.649824885))
            ThreePointArc((-97.001751152, -89.649824885), (-96.294644371, -89.942718104), (-96.001751152, -90.649824885))
            Line((-96.001751152, -90.649824885), (-96.001751152, -122.649824885))
            ThreePointArc((-96.001751152, -122.649824885), (-94.537285058, -126.185358791), (-91.001751152, -127.649824885))
            Line((-91.001751152, -127.649824885), (-76.001751152, -127.649824885))
            ThreePointArc((-76.001751152, -127.649824885), (-79.537285058, -126.185358791), (-81.001751152, -122.649824885))
            Line((-81.001751152, -122.649824885), (-81.001751152, -90.649824885))
            ThreePointArc((-81.001751152, -90.649824885), (-81.294644371, -89.942718104), (-82.001751152, -89.649824885))
            Line((-82.001751152, -89.649824885), (-84.001751152, -89.649824885))
            ThreePointArc((-84.001751152, -89.649824885), (-87.001751152, -86.649824885), (-84.001751152, -83.649824885))
            Line((-84.001751152, -83.649824885), (-82.001751152, -83.649824885))
            ThreePointArc((-82.001751152, -83.649824885), (-81.294644371, -83.356931666), (-81.001751152, -82.649824885))
            Line((-81.001751152, -82.649824885), (-81.001751152, 82.350175115))
            ThreePointArc((-81.001751152, 82.350175115), (-81.294644371, 83.057281896), (-82.001751152, 83.350175115))
            Line((-82.001751152, 83.350175115), (-84.001751152, 83.350175115))
            ThreePointArc((-84.001751152, 83.350175115), (-87.001751152, 86.350175115), (-84.001751152, 89.350175115))
            Line((-84.001751152, 89.350175115), (-82.001751152, 89.350175115))
            ThreePointArc((-82.001751152, 89.350175115), (-81.294644371, 89.643068334), (-81.001751152, 90.350175115))
            Line((-81.001751152, 90.350175115), (-81.001751152, 122.350175115))
        make_face()
        with Locations((-99.001751152, -86.649824885)):
            Circle(Y_Z_TA_1_2_OUTLINE_R, mode=Mode.SUBTRACT)
        with Locations((-99.001751152, 86.350175115)):
            Circle(Y_Z_TA_1_2_OUTLINE_R, mode=Mode.SUBTRACT)
    # profile 4 of 5: a face of its own
    with BuildSketch(Plane.YZ):
        with Locations((-84.001751152, 86.350175115)):
            Circle(Y_Z_TA_1_2_OUTLINE_R)
    # profile 5 of 5: a face of its own
    with BuildSketch(Plane.YZ):
        with Locations((-84.001751152, -86.649824885)):
            Circle(Y_Z_TA_1_2_OUTLINE_R)
    extrude(amount=Y_Z_TA_1_2_DEPTH)


solid = part.part
